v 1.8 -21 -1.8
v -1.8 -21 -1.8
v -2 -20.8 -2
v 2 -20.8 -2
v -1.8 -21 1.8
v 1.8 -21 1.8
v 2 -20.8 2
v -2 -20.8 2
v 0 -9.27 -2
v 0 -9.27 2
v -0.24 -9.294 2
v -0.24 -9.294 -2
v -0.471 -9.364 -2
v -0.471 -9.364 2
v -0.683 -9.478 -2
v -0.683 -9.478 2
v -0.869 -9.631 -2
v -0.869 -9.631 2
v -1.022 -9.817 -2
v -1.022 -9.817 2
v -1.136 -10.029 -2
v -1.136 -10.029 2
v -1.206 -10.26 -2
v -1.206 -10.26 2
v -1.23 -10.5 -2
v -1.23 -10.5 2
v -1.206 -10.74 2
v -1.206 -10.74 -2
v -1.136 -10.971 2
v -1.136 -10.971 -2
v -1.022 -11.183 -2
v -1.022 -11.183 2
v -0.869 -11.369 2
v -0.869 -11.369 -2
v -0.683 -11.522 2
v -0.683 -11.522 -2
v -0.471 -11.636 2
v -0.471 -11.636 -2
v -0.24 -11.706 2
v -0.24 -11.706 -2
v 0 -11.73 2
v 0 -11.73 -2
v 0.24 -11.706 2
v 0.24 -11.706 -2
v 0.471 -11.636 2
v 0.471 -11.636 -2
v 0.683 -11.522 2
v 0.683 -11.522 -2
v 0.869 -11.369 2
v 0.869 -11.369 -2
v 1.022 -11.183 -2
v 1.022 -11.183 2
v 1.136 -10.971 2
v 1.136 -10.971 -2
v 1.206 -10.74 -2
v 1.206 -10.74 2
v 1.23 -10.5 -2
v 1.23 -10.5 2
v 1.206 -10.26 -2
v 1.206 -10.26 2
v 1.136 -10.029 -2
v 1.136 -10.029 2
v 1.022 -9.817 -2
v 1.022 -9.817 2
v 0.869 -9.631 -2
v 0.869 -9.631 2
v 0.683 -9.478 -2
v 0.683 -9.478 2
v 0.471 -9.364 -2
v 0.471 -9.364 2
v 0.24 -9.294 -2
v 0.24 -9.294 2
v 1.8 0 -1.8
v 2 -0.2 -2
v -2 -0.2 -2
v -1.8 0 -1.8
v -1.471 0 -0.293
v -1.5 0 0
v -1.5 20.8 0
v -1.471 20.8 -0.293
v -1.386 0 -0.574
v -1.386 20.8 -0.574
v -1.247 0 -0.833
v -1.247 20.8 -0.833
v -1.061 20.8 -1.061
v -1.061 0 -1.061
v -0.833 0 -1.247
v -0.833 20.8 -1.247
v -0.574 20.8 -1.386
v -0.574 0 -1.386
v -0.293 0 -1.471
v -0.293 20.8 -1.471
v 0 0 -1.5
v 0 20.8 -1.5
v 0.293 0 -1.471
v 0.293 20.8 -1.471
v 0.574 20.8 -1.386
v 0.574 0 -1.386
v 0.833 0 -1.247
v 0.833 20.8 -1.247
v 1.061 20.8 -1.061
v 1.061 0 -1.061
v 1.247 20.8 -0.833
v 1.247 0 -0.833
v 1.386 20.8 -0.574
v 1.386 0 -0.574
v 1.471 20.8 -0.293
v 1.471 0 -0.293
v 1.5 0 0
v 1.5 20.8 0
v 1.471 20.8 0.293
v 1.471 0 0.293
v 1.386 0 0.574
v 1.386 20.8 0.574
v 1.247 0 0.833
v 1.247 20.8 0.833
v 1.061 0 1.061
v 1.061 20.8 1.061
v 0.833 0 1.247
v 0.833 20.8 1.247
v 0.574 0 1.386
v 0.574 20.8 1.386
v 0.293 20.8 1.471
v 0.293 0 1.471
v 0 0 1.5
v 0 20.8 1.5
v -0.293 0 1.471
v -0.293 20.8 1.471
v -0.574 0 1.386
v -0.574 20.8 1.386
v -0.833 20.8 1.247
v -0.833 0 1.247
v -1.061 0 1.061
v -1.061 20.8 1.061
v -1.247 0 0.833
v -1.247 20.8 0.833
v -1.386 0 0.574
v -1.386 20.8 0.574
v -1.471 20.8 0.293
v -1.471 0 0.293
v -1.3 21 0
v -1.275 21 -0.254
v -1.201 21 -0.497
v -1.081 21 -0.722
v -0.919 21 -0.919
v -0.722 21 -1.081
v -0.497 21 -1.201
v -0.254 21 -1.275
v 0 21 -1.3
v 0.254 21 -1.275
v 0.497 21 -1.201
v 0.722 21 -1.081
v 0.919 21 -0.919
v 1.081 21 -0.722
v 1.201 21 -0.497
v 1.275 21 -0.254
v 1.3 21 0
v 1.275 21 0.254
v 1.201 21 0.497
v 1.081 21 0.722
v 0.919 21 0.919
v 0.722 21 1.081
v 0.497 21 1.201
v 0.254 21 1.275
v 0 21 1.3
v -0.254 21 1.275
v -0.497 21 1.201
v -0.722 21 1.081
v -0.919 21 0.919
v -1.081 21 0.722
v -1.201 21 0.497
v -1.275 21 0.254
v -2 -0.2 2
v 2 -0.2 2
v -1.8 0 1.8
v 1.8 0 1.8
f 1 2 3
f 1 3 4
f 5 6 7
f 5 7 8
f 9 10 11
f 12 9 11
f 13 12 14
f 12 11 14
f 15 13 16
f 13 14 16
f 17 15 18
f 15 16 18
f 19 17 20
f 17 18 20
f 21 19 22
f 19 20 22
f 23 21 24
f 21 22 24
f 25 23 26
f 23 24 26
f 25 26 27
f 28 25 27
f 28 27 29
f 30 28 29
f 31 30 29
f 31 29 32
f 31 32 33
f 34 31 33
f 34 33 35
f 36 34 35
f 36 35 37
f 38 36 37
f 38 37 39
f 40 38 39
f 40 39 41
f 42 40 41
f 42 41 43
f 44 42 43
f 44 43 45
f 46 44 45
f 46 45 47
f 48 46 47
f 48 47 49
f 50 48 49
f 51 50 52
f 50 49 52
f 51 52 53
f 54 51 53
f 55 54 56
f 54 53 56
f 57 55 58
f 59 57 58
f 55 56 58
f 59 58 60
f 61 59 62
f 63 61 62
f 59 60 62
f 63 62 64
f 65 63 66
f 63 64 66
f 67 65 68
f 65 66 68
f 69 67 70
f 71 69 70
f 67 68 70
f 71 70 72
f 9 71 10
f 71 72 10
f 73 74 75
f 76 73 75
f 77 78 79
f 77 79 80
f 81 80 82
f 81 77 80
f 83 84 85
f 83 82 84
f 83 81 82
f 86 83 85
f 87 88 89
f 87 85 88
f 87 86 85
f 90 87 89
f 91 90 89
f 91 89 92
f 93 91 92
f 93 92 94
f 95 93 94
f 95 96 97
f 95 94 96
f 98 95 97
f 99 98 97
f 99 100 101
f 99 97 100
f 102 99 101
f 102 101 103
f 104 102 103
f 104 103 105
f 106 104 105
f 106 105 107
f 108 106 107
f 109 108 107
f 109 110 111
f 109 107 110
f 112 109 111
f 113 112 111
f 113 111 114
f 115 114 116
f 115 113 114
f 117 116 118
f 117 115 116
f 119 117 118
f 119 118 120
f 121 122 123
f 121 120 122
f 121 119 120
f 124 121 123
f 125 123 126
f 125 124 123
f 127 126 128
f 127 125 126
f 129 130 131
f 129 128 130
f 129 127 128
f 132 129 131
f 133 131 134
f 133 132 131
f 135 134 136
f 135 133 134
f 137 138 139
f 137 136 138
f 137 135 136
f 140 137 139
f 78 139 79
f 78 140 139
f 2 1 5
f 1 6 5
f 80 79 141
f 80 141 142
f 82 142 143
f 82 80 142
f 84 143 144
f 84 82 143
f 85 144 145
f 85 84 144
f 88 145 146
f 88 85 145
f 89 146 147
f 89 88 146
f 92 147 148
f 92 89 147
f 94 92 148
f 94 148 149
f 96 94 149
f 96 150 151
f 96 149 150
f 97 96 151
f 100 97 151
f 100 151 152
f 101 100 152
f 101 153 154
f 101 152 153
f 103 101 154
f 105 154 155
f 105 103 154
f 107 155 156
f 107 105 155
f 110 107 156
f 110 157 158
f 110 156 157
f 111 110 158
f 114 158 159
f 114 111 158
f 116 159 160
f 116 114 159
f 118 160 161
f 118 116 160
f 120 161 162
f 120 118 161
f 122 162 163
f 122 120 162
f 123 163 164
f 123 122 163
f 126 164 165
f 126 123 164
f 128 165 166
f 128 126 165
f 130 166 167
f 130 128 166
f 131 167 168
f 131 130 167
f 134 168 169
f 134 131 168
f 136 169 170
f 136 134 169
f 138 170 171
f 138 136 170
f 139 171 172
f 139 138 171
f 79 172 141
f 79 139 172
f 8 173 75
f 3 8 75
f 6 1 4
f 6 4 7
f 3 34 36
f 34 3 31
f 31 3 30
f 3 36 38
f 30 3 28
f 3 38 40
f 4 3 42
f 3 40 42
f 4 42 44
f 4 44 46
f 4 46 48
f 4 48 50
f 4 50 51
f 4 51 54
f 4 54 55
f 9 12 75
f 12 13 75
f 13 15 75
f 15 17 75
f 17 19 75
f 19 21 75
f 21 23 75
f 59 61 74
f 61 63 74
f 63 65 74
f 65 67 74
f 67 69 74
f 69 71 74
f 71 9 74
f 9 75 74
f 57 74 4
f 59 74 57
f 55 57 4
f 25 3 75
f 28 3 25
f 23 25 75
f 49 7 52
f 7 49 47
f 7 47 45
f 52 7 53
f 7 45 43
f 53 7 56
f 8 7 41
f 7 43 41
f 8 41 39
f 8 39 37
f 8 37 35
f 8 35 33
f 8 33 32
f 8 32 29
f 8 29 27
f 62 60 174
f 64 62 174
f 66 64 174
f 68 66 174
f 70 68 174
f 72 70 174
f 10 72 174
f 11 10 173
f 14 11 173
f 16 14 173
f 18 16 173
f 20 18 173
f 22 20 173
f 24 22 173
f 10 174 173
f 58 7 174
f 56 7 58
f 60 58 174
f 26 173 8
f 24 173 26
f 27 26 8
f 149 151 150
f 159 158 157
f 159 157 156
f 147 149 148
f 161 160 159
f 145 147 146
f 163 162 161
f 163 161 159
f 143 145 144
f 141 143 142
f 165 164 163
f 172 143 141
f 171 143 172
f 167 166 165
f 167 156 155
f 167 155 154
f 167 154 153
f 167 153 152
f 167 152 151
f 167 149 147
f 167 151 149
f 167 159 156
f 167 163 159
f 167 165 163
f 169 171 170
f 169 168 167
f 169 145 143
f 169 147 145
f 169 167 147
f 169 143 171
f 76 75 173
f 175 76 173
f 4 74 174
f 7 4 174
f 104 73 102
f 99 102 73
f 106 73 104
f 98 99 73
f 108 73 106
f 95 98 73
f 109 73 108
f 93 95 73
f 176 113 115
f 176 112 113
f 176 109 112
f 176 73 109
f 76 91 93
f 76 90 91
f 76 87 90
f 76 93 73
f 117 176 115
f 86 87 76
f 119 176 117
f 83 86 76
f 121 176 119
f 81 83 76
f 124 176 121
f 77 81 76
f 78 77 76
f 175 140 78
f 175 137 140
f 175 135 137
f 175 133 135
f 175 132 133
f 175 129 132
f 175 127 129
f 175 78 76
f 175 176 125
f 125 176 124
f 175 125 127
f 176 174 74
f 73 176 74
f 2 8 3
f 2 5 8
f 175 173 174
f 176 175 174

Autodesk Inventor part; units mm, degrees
ref_plane "YZ Plane" through (0, 0, 0) normal (1, 0, 0) x (0, 1, 0)
ref_plane "XZ Plane" through (0, 0, 0) normal (0, 1, 0) x (-1, 0, 0)
ref_plane "XY Plane" through (0, 0, 0) normal (0, 0, 1) x (1, 0, 0)
sketch "Sketch4" plane through (0, 0, 0) normal (0, 1, 0) x (-1, 0, 0)
  circle A0 centre (0, 0) radius 1.5
  line L0 (-2, 2) -> (2, 2)
  line L1 (2, 2) -> (2, -2)
  line L2 (2, -2) -> (-2, -2)
  line L3 (-2, -2) -> (-2, 2)
  line L4 (-2, 2) -> (2, -2) construction
  line L5 (2, 2) -> (-2, -2) construction
  point P0 (-1.5, 0)
  point P1 (0, -1.5)
  point P2 (0, 1.5)
  point P3 (1.5, 0)
  dimension "Radius" = 3
  dimension "d103" = 4
extrude "Extrusion2" add sketch "Sketch4" along normal mid plane 42 contours A0
extrude "Extrusion10" add sketch "Sketch4" against normal up to surface (21 mm away) contours A0 | L0 L1 L2 L3
chamfer "Chamfer1" distance 0.2 angle 45 9 edges at (1.5, 21, 0) (0, -21, -2) (2, -21, 0) (0, -21, 2) (-2, -21, 0) (2, 0, 0) (0, 0, 2) (-2, 0, 0) (0, 0, -2)
sketch "Sketch14" plane through (2, -0.2, -2) normal (0, 0, -1) x (-1, 0, 0)
  line L0 (0, 0) -> (0, -20.6) projected
  line L1 (0, -10.3) -> (2, -10.3) construction
  point P0 (2, 0.2)
hole "Hole6" at (0, -10.5, -2) direction (0, 0, 1) diameter 2.459 end through all thread size "M3x0.5" class "6H" standard "ISO Metric profile"
properties part number "Ball Track Rest Pin" material "Bronze, Soft Tin"
